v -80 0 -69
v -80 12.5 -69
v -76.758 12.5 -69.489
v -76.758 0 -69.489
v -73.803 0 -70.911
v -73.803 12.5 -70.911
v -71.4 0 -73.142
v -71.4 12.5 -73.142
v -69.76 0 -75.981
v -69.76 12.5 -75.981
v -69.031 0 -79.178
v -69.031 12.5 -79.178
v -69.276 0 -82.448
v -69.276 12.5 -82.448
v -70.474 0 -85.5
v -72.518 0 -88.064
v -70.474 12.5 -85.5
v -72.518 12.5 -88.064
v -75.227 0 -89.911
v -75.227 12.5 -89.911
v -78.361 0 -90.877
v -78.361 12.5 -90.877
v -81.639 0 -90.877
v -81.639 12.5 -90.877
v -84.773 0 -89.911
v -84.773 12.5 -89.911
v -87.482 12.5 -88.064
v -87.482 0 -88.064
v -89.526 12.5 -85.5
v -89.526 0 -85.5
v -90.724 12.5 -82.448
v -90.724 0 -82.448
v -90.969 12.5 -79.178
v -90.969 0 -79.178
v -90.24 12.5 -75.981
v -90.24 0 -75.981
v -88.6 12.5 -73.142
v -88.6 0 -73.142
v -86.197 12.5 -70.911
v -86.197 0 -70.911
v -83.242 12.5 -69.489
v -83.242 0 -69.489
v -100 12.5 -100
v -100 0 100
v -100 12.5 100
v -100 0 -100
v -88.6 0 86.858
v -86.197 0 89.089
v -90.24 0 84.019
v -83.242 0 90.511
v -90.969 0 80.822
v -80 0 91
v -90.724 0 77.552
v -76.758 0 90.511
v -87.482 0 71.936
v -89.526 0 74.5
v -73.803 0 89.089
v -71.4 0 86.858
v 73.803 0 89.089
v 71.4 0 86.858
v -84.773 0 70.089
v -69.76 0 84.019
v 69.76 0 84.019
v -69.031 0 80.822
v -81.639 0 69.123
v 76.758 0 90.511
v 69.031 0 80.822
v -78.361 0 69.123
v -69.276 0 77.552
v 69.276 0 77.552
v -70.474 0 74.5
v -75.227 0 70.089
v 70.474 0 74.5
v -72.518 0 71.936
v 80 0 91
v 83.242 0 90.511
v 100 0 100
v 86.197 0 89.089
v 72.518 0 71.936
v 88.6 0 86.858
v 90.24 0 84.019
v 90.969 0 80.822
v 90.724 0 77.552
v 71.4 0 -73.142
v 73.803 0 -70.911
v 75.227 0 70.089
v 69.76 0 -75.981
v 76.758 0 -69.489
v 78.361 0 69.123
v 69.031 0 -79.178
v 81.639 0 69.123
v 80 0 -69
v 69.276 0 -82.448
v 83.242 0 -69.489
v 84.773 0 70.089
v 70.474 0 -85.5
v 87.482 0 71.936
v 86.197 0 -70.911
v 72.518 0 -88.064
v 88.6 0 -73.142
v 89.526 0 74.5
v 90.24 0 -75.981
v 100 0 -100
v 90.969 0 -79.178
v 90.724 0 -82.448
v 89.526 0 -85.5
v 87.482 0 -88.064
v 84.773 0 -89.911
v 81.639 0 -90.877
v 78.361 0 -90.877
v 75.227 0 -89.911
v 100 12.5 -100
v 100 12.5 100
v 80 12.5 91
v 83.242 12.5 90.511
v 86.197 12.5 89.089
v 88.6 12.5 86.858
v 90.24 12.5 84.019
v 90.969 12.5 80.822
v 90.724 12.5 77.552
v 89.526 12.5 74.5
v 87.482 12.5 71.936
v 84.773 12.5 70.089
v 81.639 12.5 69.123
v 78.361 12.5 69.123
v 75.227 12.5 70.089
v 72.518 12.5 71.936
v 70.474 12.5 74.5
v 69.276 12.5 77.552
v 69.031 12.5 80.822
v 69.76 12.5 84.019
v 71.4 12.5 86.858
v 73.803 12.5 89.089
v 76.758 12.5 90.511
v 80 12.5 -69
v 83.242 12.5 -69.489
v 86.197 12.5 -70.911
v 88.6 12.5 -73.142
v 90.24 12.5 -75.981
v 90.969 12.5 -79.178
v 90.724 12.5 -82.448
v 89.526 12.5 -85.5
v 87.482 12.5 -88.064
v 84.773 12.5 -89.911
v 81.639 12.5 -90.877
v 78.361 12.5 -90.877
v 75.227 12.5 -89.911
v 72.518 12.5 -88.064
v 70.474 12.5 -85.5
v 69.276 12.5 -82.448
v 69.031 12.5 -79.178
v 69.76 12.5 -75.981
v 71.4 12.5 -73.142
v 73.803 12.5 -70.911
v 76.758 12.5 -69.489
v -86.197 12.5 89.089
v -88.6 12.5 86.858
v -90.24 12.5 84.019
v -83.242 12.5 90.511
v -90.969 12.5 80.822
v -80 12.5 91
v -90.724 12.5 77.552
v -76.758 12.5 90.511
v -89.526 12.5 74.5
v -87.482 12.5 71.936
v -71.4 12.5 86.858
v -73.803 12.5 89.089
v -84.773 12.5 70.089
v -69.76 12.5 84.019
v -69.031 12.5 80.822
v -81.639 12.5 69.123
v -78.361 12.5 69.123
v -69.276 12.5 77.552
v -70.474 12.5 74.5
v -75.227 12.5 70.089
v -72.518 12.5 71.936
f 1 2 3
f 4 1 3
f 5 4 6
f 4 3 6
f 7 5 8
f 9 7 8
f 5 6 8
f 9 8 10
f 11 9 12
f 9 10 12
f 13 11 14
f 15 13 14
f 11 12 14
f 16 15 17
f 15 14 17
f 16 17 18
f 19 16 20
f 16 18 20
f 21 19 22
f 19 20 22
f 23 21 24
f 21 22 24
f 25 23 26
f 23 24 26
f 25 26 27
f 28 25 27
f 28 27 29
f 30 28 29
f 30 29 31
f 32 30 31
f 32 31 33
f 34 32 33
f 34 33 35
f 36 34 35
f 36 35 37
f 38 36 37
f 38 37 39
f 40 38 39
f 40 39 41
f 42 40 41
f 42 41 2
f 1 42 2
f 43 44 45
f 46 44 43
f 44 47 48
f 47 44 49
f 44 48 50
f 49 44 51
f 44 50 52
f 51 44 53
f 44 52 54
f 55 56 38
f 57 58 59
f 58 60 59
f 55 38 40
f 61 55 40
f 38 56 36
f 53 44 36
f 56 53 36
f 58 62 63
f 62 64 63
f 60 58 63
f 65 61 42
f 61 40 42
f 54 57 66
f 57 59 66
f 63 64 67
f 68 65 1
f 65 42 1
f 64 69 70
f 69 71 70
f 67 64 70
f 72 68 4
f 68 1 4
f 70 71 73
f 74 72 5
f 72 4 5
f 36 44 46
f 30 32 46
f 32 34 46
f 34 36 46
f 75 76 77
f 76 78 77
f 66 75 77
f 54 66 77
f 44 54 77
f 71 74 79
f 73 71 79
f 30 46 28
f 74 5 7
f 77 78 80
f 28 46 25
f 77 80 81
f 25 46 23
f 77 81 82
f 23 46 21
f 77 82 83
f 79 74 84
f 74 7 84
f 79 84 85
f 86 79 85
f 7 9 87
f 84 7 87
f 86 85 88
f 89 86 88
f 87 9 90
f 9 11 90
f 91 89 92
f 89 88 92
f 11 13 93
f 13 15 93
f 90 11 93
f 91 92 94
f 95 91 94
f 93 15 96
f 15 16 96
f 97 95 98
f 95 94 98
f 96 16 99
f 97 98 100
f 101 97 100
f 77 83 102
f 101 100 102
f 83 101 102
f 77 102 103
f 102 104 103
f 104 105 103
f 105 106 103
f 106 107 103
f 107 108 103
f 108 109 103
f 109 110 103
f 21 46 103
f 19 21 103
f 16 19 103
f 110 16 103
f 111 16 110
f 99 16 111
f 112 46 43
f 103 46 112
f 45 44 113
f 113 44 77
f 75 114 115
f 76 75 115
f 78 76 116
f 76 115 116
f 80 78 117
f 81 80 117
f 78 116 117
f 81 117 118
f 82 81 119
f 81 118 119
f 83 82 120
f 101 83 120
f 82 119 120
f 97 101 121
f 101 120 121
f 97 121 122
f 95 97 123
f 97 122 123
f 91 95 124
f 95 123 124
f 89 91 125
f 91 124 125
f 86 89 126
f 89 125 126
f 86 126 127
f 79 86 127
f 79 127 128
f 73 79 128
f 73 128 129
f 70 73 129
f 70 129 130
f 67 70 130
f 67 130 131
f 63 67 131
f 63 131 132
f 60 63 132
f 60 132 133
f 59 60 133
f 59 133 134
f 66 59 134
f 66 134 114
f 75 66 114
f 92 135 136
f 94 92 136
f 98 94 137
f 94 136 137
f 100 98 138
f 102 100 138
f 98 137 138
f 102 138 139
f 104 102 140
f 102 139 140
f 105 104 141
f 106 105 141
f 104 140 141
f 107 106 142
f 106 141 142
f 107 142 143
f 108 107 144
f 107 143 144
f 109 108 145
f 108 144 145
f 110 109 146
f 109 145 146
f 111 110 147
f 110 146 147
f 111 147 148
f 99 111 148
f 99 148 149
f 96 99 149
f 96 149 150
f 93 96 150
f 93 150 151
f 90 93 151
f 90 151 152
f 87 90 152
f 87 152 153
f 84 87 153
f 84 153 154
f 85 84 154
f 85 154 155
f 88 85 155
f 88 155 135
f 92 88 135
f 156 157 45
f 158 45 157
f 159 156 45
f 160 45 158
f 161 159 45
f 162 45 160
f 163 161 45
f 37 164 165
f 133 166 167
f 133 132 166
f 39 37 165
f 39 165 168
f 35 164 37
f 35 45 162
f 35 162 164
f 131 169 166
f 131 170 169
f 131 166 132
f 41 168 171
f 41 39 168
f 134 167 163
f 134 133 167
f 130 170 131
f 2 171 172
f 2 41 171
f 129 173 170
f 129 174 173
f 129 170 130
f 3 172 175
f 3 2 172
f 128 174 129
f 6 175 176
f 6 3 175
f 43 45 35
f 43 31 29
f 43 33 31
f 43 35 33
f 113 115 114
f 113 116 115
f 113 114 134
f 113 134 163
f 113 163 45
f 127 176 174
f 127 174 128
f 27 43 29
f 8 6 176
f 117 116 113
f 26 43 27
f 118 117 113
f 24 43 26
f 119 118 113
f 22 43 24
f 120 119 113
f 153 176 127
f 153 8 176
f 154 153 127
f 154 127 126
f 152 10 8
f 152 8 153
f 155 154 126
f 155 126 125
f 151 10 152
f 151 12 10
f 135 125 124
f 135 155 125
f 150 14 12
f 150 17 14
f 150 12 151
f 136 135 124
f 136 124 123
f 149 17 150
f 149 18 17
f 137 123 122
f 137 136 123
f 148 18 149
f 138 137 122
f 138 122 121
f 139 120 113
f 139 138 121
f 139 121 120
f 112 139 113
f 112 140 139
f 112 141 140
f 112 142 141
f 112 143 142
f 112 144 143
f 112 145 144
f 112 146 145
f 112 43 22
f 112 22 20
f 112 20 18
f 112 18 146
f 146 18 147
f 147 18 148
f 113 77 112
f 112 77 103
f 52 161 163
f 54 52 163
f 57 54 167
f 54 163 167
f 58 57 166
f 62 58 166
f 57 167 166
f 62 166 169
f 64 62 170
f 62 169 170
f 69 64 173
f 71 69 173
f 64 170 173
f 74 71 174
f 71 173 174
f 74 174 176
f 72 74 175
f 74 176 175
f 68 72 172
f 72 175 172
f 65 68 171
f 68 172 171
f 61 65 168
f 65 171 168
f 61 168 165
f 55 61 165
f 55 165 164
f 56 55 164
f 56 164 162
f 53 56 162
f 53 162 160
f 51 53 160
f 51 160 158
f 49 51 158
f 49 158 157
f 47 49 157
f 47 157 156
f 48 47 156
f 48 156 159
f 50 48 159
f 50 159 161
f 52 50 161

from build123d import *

# Parameters (mm, degrees)
ESBO_O1_W                 = 200
ESBO_O1_H                 = 200
RESSALTO_EXTRUS_O1_DEPTH  = 12.5
ESBO_O2_R                 = 11
CORTE_EXTRUS_O1_DEPTH     = 142.972708645
PADR_O_LINEAR1_COUNT      = 2
PADR_O_LINEAR1_PITCH      = 160
PADR_O_LINEAR1_COUNT_DIR2 = 2
PADR_O_LINEAR1_PITCH_DIR2 = 160


with BuildPart() as part:
    # Esboço1 → Ressalto-extrusão1 (new body)
    with BuildSketch(Plane(origin=(0, 0, 0), x_dir=(1, 0, 0), z_dir=(0, 1, 0))):
        Rectangle(ESBO_O1_W, ESBO_O1_H)
    extrude(amount=RESSALTO_EXTRUS_O1_DEPTH)

    # Esboço2 → Corte-extrusão1 (cut, through all)
    with BuildSketch(Plane(origin=(0, 12.5, 0), x_dir=(1, 0, 0), z_dir=(0, 1, 0))):
        with Locations(Location((-80, 80, 0), (0, 0, 270))):
            Circle(ESBO_O2_R)
    corte_extrus_o1 = extrude(amount=-CORTE_EXTRUS_O1_DEPTH, mode=Mode.SUBTRACT)

    # Padrão linear1: Corte-extrus_o1 2 × 2
    with Locations(*[(i * PADR_O_LINEAR1_PITCH, 0, j * PADR_O_LINEAR1_PITCH_DIR2) for i in range(PADR_O_LINEAR1_COUNT) for j in range(PADR_O_LINEAR1_COUNT_DIR2) if (i, j) != (0, 0)]):
        add(corte_extrus_o1, mode=Mode.SUBTRACT)


solid = part.part
